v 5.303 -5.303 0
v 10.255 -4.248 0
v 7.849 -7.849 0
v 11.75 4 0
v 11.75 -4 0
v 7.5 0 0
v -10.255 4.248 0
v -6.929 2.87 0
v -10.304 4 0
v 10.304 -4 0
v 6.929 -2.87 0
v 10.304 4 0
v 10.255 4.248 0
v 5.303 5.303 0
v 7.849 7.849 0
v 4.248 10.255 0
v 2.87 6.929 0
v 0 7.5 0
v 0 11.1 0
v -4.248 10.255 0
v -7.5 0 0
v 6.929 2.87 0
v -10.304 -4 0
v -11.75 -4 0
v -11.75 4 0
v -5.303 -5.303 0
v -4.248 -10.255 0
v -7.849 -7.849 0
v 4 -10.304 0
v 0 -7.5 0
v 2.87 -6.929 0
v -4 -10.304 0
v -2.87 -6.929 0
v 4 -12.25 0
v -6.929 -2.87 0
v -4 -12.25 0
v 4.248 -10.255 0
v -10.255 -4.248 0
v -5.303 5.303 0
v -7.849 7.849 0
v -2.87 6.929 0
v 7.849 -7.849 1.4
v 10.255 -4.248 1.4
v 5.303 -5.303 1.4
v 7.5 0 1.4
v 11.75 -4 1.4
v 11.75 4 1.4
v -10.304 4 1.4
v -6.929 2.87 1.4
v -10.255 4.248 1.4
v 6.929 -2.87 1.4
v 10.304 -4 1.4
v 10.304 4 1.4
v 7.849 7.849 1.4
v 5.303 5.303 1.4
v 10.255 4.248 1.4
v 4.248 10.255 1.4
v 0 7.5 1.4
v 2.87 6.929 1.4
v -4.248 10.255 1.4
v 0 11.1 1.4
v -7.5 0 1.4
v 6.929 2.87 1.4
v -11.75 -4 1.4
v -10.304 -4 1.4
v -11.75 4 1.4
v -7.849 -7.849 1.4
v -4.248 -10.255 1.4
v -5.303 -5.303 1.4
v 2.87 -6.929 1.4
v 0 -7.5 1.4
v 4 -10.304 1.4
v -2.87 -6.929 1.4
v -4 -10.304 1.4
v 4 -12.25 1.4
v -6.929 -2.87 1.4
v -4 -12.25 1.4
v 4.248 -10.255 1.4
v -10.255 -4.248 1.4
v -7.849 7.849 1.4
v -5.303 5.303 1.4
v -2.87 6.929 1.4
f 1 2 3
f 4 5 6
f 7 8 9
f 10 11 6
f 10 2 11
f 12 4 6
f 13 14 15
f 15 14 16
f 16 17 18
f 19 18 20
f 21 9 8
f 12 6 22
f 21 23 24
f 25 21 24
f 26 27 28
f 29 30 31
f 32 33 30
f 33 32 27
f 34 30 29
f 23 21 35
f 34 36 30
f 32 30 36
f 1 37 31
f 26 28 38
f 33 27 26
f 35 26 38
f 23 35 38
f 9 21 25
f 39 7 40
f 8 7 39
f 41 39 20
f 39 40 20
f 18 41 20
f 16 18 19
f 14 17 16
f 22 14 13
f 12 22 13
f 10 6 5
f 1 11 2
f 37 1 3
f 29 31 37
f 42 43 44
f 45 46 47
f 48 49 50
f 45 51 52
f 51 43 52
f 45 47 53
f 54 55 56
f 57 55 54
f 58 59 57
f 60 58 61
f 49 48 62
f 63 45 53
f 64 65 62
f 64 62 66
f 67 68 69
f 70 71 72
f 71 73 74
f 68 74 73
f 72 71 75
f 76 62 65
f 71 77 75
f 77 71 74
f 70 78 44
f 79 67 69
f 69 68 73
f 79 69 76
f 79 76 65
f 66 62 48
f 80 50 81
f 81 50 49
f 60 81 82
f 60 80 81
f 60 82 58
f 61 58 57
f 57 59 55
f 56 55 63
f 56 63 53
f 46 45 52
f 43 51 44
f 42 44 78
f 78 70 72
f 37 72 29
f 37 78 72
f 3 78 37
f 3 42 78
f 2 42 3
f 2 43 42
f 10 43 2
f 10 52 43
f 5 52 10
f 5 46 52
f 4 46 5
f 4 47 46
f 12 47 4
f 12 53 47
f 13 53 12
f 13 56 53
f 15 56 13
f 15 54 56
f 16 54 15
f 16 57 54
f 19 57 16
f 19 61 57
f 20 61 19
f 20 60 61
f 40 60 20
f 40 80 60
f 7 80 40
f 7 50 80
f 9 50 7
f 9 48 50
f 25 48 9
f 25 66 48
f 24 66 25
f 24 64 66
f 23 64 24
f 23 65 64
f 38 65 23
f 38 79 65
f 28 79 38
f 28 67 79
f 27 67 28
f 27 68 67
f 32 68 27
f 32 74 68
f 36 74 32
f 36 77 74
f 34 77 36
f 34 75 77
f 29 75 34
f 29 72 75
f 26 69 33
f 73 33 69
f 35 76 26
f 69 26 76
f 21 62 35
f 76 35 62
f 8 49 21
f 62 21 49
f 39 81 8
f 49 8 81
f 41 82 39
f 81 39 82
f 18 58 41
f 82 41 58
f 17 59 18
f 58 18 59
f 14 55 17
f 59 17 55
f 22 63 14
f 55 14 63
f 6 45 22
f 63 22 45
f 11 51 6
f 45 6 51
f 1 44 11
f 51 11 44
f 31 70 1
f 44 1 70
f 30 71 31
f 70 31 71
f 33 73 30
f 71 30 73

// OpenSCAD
// file: common.scad
// Copyright 2019 a.j.buxton@gmail.com
// CC BY-NC-ND 4.0

w = 150.5;
h = 65;


button_radius = 8.4/2;
button_height = 4.5;

// abxy and dpad holes
button_hole_diameter = 29;
// analog stick
analog_hole_diameter = 22.5;


button_letters = ["A", "B", "X", "Y"];
button_rotations = [180, 90, 270, 0];
button_colours = ["red", "yellow", "lightblue", "lightgreen"];





module outline() {
    offset(5) offset(-5) square([w, h], center=true);
}


module shell(height=7.6) {
    difference() {
        linear_extrude(height=height) difference() {
            offset(1.6) outline();
            outline();

        }
    }
}


module dpad_pos() {
    translate([(w/2)-17.5, -9]) children();
}

module analog_pos() {
    translate([(w/2)-16.75, 21.25]) children();
}

module btn_pos() {
    translate([18.7-(w/2), 10.4]) children();
}

module smlbtn_pos() {
    translate([18.7-(w/2), -17.5]) children();
}

module led_pos() {
    translate([-48.75, 30]) children();
    translate([-56.75, 30]) children();
    translate([-64.75, 30]) children();
}

module screw_pos(internal=true) {
    translate([0, 0.2, 0]) {
        translate([143.5/2, 0]) {
            translate([0, -29]) children();
            if (internal) translate([0, 0]) children();
            translate([0, 29]) children();
            if (internal) translate([-30, 0]) {
                //translate([0, -29]) children();
                translate([0, 0]) children();
                translate([0, 29]) children();
            }
        }
        translate([-144.5/2, 0]) {
            translate([0, -29]) children();
            if (internal) translate([0, 0]) children();
            translate([0, 29]) children();
            if (internal) translate([30, 0]) {
                translate([0, -29]) children();
                //translate([0, 0]) children();
                translate([0, 29]) children();
            }
        }
    }
}


// TODO: Remove these


module dpad() {
    offset(r=0.5) offset(r=-0.5) offset(r=-0.5) offset(r=0.5) union() {
        square([6.5, 19], center=true);
        square([19, 6.5], center=true);
    }
}

module smlbtn() {
    translate([9.5/2, 0]) children(); //circle(d=5.2);
    translate([-9.5/2, 0]) children();

}
// main file
// Copyright 2019 a.j.buxton@gmail.com
// CC BY-NC-ND 4.0

include <common.scad>;

RES = undef;

$fn = RES ? RES : 16;

module analog() {
    circle(d=15);
}

module analog_insert() {
    linear_extrude(height=1.4) difference() {
        union() {
            circle(d=analog_hole_diameter-0.3);
            translate([0, -1, 0]) square([8, analog_hole_diameter], center=true);
            square([analog_hole_diameter+1, 8], center=true);
        }
        analog();
    }

}


analog_insert();
